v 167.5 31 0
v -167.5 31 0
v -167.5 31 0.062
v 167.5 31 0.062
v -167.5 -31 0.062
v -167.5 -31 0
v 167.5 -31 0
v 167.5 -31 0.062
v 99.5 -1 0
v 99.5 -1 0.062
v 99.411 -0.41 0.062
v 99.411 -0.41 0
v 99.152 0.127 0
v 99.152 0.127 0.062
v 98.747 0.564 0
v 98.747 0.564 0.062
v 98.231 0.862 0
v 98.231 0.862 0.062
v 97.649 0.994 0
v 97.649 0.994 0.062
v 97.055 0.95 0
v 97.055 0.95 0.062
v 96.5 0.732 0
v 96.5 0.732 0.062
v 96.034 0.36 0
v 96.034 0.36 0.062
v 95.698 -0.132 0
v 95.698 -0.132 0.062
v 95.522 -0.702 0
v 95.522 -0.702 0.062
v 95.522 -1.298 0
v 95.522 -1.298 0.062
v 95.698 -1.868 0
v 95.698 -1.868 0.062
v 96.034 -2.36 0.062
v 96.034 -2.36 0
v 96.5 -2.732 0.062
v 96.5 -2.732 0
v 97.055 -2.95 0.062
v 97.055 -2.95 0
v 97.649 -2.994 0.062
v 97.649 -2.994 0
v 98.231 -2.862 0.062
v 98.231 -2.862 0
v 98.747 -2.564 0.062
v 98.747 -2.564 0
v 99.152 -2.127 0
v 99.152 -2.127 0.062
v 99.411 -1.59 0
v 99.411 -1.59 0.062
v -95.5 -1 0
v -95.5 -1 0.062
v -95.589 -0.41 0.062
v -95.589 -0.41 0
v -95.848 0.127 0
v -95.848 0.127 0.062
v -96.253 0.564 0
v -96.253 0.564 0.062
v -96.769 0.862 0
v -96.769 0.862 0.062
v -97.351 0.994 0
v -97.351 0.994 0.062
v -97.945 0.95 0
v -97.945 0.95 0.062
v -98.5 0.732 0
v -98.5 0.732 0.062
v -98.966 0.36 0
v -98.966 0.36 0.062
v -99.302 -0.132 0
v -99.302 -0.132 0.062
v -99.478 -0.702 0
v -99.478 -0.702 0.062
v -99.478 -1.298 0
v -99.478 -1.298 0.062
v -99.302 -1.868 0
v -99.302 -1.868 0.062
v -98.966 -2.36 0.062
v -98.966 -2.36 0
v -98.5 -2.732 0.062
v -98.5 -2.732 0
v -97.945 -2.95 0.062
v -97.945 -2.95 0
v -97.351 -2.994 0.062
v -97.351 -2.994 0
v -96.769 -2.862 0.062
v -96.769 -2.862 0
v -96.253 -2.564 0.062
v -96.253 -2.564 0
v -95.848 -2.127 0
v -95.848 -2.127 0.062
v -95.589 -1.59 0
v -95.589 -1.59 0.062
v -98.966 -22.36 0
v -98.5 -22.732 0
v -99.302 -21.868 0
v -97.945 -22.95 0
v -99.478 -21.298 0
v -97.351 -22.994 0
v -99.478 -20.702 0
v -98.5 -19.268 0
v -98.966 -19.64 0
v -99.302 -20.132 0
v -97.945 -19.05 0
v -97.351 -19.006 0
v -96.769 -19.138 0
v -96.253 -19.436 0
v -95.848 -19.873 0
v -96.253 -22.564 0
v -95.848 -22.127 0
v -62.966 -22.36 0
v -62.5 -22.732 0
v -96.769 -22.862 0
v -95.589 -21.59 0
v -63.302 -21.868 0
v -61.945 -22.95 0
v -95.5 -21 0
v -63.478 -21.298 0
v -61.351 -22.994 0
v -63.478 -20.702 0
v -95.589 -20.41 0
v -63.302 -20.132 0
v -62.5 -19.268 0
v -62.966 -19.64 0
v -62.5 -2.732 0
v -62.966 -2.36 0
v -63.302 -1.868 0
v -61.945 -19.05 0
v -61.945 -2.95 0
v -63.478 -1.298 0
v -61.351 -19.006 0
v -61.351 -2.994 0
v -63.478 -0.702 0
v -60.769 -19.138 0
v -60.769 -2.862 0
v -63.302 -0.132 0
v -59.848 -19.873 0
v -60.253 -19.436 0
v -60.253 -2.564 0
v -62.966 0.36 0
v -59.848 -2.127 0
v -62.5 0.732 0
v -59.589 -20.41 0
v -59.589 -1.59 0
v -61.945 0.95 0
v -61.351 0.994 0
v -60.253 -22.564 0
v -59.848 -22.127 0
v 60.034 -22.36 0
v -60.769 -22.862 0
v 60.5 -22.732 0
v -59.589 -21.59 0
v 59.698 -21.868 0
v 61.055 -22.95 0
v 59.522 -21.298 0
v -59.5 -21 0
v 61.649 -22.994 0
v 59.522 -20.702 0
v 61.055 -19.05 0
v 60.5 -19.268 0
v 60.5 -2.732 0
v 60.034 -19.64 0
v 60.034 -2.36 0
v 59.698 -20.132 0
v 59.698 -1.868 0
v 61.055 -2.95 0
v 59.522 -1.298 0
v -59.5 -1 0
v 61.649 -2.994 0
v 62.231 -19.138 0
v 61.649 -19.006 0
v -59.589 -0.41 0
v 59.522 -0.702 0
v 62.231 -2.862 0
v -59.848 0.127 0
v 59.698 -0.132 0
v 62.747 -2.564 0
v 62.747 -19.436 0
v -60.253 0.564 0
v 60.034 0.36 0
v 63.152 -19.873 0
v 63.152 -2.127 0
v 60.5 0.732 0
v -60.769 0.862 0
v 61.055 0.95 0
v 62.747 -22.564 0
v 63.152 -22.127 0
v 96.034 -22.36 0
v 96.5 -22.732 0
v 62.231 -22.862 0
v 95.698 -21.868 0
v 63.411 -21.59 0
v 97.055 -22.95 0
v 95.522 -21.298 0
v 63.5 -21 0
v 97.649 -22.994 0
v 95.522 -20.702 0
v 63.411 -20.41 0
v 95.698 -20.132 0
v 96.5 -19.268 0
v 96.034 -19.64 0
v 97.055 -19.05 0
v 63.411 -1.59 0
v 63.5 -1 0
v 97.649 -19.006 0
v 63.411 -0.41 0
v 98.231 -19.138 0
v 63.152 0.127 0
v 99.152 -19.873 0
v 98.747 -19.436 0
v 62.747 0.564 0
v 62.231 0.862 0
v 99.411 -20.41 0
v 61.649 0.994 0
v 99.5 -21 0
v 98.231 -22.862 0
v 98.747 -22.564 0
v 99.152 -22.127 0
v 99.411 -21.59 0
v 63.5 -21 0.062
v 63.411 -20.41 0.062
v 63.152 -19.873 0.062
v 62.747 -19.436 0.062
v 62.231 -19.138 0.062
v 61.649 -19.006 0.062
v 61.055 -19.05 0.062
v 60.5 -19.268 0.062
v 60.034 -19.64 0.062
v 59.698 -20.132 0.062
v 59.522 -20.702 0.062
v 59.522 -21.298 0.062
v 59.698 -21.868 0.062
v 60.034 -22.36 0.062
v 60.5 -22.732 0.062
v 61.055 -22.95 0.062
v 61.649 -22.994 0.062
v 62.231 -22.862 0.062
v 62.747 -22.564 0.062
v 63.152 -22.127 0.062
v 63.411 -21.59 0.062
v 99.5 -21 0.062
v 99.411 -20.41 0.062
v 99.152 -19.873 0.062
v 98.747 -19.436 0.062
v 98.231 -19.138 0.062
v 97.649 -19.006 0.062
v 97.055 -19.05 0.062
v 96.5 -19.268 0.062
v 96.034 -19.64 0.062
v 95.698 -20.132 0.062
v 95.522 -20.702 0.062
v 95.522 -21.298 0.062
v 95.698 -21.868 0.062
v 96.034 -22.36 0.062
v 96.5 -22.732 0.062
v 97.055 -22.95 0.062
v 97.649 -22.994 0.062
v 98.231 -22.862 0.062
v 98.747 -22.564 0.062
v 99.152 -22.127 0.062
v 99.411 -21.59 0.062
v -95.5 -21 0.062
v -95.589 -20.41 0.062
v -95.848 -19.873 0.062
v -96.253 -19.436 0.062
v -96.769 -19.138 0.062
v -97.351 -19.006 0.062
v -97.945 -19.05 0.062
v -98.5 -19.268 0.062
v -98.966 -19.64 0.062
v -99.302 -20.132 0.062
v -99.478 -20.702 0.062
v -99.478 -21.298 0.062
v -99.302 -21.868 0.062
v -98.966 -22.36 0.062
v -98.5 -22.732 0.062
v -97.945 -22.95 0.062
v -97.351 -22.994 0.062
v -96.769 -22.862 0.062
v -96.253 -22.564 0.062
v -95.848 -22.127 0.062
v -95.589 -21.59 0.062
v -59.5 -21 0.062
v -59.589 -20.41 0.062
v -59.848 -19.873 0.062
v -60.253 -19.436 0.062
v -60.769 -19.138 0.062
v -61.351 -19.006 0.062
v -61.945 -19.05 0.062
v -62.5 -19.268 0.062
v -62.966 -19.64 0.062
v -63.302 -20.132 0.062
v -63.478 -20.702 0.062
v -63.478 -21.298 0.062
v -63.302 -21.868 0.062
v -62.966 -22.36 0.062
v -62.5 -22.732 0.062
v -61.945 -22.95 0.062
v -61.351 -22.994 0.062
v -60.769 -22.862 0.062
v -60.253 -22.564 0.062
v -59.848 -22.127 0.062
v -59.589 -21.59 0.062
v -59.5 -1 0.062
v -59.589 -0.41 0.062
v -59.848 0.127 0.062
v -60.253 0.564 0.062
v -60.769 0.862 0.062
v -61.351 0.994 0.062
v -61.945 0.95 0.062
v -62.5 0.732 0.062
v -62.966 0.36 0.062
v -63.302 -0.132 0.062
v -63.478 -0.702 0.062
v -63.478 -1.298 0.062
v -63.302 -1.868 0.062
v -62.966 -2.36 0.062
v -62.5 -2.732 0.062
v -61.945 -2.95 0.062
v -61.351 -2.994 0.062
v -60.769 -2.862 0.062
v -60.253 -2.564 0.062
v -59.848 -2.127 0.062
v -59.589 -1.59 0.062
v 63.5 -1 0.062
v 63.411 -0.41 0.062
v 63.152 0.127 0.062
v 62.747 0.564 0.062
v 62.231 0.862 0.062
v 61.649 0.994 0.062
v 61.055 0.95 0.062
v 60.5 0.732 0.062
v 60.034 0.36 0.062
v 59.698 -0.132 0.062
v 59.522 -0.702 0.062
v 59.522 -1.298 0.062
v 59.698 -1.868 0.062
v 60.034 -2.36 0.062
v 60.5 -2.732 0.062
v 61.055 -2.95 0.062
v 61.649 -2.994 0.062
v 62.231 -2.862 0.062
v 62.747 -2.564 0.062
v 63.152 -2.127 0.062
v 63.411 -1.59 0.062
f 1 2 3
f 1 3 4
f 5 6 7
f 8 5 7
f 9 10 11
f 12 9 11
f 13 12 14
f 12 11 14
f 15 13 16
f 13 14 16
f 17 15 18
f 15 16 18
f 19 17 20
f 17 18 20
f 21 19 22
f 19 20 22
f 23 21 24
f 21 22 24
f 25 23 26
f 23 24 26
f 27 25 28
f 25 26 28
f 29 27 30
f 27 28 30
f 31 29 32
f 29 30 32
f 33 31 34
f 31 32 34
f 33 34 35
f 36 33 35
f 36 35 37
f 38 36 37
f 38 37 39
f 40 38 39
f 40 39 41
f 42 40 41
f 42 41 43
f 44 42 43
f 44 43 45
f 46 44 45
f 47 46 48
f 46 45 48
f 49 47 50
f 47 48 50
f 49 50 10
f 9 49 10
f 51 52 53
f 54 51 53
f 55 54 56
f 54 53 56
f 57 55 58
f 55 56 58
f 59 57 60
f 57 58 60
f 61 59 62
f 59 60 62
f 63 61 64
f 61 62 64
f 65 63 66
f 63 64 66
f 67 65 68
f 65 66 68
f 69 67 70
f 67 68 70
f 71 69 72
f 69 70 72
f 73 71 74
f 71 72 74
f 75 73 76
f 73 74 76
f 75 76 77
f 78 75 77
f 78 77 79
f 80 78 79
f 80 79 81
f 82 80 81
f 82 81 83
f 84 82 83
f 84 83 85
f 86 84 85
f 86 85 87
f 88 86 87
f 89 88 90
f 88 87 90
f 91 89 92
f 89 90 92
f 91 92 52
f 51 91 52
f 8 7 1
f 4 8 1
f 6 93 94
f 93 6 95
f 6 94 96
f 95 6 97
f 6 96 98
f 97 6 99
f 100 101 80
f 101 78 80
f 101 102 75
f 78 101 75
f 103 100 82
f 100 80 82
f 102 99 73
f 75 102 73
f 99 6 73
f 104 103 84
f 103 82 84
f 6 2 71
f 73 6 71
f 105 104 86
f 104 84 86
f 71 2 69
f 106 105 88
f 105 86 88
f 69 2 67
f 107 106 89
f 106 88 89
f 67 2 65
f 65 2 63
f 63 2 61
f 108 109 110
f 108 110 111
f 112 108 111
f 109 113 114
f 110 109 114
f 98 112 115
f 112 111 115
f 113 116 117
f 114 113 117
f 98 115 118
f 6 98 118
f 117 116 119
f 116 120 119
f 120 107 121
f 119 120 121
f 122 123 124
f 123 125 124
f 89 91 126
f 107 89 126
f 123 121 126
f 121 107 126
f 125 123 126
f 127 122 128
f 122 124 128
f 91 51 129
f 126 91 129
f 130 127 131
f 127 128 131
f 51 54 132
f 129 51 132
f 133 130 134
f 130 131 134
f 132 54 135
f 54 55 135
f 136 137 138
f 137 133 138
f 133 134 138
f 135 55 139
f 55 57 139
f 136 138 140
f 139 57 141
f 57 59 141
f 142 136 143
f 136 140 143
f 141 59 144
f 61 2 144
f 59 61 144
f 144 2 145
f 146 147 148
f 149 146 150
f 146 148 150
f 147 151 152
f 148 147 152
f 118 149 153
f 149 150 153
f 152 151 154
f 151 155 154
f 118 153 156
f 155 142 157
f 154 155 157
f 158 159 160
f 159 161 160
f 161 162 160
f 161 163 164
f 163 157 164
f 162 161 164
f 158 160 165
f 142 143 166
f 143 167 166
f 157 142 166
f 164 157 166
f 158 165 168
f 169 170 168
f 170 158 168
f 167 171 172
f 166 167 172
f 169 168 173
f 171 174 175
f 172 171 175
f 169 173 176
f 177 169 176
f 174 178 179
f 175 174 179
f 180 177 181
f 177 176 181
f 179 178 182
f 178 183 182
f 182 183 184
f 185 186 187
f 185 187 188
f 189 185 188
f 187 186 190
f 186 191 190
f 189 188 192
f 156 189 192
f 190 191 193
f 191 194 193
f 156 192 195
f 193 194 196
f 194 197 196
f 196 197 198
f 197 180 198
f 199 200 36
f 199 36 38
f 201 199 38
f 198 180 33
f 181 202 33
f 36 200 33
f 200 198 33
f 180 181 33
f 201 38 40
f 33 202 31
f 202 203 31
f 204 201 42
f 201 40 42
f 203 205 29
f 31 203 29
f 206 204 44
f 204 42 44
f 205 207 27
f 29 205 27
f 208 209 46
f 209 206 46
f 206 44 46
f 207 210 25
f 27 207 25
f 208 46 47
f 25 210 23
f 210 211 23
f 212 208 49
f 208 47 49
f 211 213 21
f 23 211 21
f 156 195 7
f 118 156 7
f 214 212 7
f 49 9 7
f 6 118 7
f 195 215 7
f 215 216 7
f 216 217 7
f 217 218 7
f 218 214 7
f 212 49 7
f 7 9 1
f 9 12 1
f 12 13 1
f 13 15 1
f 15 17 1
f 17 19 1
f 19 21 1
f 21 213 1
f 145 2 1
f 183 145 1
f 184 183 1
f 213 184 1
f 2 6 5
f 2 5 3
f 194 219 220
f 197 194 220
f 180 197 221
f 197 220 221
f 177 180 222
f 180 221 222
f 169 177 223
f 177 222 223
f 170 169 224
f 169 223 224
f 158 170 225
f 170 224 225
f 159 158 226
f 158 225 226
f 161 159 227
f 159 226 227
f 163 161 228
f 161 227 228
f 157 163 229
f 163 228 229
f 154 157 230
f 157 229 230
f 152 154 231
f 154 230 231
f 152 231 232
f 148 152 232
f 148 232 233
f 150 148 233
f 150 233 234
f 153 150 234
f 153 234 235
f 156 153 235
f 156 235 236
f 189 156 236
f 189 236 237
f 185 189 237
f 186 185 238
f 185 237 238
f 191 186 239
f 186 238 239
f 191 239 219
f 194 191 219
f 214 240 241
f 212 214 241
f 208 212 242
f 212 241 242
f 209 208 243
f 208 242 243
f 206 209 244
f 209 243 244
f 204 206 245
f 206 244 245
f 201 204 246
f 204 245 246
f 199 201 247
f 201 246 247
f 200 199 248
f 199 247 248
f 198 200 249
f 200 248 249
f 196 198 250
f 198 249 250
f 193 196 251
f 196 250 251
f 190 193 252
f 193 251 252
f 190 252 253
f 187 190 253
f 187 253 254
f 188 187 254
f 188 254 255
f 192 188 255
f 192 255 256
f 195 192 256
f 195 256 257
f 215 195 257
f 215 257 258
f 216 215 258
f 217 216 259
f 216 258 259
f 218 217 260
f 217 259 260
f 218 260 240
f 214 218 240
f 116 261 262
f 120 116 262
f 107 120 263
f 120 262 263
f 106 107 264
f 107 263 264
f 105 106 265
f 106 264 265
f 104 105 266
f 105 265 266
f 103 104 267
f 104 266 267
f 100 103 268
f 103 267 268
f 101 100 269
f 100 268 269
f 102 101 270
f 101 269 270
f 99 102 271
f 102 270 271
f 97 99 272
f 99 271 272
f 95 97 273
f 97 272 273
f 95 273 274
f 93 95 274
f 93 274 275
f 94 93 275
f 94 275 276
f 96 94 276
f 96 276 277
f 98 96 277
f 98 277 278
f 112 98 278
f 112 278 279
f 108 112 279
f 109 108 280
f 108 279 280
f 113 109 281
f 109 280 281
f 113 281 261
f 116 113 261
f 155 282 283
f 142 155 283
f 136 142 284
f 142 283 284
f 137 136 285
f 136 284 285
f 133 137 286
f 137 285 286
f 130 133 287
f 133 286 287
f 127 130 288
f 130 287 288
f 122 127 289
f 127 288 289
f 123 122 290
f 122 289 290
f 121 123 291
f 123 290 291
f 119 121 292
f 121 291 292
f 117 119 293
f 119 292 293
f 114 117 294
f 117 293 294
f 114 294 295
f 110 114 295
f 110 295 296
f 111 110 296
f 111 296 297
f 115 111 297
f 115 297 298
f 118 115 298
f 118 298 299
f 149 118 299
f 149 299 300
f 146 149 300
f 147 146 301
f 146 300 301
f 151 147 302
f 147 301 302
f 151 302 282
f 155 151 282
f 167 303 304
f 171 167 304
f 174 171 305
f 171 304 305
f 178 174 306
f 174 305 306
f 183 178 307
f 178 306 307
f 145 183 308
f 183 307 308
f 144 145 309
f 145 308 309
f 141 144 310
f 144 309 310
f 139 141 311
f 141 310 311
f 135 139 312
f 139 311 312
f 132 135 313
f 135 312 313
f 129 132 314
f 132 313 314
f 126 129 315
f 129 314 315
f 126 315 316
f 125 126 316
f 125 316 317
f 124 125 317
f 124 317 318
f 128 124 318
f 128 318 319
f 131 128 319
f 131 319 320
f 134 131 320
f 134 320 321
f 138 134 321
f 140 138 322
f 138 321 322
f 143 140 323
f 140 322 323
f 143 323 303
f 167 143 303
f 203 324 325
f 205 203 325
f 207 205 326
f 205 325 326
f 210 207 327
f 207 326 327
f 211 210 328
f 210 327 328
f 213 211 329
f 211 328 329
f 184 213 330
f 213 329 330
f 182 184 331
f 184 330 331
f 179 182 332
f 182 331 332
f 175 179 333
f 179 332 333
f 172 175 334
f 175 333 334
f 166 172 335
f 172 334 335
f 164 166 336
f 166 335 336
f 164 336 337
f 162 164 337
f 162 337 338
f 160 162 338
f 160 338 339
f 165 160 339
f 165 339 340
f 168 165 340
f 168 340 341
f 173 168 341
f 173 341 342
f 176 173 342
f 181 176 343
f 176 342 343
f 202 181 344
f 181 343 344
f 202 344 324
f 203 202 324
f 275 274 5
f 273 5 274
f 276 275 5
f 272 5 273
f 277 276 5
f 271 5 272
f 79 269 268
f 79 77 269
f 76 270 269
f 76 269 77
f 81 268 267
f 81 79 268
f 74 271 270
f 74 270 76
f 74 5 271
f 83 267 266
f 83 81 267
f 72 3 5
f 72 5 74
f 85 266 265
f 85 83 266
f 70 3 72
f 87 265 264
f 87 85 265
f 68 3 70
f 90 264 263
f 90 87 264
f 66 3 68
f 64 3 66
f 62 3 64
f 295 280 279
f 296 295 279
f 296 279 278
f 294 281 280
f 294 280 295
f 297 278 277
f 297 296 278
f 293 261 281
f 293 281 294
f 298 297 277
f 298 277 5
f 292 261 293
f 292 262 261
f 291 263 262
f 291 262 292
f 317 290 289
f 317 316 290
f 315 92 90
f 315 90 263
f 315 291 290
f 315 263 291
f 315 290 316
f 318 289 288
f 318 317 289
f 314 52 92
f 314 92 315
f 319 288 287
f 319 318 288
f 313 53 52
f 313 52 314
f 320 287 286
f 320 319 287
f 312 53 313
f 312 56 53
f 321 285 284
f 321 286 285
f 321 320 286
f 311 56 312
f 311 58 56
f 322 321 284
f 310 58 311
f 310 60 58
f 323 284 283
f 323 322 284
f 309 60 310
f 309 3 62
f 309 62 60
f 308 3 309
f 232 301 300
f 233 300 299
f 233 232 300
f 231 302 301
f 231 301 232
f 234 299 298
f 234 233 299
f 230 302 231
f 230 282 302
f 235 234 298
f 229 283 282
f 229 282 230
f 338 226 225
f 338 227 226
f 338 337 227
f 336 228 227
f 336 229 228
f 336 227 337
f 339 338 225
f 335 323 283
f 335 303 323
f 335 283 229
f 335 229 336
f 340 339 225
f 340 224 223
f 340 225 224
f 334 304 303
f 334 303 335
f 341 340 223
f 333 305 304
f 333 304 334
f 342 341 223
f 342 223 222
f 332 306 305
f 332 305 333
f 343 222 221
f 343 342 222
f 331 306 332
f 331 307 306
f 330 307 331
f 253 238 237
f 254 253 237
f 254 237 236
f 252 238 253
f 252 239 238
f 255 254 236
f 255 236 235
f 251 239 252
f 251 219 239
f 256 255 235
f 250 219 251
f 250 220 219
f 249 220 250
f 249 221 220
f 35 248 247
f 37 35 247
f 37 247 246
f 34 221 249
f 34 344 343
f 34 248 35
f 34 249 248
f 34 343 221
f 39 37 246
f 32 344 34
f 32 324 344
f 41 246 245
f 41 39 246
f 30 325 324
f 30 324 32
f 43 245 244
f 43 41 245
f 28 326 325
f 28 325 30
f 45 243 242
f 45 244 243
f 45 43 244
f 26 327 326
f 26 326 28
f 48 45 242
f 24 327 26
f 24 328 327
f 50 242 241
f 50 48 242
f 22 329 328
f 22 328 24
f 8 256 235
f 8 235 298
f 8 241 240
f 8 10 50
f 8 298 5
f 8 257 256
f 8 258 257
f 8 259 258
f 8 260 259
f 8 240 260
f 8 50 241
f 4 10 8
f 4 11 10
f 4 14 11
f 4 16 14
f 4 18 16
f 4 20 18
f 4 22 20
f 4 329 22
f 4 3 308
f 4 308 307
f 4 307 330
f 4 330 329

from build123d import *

# Parameters (mm, degrees)
SKETCH1_W                   = 335
SKETCH1_H                   = 62
BODY_DEPTH                  = 0.0625
SKETCH2_R                   = 2
CAMERA_MOUNTING_HOLES_DEPTH = 0.0625
SKETCH3_R                   = 2
MOUNTING_HOLES_DEPTH        = 0.0625


with BuildPart() as part:
    # Sketch1 → Body (new body)
    with BuildSketch(Plane.XY):
        Rectangle(SKETCH1_W, SKETCH1_H)
    extrude(amount=BODY_DEPTH)

    # Sketch2 → Camera Mounting holes (cut)
    with BuildSketch(Plane.XY.offset(0.0625)):
        with Locations((-61.5, -1)):
            Circle(SKETCH2_R)
        with Locations((-61.5, -21)):
            Circle(SKETCH2_R)
        with Locations((61.5, -1)):
            Circle(SKETCH2_R)
        with Locations((61.5, -21)):
            Circle(SKETCH2_R)
    extrude(amount=-CAMERA_MOUNTING_HOLES_DEPTH, mode=Mode.SUBTRACT)

    # Sketch3 → Mounting Holes (cut)
    with BuildSketch(Plane.XY.offset(0.0625)):
        with Locations((-97.5, -1)):
            Circle(SKETCH3_R)
        with Locations((-97.5, -21)):
            Circle(SKETCH3_R)
        with Locations((97.5, -1)):
            Circle(SKETCH3_R)
        with Locations((97.5, -21)):
            Circle(SKETCH3_R)
    extrude(amount=-MOUNTING_HOLES_DEPTH, mode=Mode.SUBTRACT)


solid = part.part
